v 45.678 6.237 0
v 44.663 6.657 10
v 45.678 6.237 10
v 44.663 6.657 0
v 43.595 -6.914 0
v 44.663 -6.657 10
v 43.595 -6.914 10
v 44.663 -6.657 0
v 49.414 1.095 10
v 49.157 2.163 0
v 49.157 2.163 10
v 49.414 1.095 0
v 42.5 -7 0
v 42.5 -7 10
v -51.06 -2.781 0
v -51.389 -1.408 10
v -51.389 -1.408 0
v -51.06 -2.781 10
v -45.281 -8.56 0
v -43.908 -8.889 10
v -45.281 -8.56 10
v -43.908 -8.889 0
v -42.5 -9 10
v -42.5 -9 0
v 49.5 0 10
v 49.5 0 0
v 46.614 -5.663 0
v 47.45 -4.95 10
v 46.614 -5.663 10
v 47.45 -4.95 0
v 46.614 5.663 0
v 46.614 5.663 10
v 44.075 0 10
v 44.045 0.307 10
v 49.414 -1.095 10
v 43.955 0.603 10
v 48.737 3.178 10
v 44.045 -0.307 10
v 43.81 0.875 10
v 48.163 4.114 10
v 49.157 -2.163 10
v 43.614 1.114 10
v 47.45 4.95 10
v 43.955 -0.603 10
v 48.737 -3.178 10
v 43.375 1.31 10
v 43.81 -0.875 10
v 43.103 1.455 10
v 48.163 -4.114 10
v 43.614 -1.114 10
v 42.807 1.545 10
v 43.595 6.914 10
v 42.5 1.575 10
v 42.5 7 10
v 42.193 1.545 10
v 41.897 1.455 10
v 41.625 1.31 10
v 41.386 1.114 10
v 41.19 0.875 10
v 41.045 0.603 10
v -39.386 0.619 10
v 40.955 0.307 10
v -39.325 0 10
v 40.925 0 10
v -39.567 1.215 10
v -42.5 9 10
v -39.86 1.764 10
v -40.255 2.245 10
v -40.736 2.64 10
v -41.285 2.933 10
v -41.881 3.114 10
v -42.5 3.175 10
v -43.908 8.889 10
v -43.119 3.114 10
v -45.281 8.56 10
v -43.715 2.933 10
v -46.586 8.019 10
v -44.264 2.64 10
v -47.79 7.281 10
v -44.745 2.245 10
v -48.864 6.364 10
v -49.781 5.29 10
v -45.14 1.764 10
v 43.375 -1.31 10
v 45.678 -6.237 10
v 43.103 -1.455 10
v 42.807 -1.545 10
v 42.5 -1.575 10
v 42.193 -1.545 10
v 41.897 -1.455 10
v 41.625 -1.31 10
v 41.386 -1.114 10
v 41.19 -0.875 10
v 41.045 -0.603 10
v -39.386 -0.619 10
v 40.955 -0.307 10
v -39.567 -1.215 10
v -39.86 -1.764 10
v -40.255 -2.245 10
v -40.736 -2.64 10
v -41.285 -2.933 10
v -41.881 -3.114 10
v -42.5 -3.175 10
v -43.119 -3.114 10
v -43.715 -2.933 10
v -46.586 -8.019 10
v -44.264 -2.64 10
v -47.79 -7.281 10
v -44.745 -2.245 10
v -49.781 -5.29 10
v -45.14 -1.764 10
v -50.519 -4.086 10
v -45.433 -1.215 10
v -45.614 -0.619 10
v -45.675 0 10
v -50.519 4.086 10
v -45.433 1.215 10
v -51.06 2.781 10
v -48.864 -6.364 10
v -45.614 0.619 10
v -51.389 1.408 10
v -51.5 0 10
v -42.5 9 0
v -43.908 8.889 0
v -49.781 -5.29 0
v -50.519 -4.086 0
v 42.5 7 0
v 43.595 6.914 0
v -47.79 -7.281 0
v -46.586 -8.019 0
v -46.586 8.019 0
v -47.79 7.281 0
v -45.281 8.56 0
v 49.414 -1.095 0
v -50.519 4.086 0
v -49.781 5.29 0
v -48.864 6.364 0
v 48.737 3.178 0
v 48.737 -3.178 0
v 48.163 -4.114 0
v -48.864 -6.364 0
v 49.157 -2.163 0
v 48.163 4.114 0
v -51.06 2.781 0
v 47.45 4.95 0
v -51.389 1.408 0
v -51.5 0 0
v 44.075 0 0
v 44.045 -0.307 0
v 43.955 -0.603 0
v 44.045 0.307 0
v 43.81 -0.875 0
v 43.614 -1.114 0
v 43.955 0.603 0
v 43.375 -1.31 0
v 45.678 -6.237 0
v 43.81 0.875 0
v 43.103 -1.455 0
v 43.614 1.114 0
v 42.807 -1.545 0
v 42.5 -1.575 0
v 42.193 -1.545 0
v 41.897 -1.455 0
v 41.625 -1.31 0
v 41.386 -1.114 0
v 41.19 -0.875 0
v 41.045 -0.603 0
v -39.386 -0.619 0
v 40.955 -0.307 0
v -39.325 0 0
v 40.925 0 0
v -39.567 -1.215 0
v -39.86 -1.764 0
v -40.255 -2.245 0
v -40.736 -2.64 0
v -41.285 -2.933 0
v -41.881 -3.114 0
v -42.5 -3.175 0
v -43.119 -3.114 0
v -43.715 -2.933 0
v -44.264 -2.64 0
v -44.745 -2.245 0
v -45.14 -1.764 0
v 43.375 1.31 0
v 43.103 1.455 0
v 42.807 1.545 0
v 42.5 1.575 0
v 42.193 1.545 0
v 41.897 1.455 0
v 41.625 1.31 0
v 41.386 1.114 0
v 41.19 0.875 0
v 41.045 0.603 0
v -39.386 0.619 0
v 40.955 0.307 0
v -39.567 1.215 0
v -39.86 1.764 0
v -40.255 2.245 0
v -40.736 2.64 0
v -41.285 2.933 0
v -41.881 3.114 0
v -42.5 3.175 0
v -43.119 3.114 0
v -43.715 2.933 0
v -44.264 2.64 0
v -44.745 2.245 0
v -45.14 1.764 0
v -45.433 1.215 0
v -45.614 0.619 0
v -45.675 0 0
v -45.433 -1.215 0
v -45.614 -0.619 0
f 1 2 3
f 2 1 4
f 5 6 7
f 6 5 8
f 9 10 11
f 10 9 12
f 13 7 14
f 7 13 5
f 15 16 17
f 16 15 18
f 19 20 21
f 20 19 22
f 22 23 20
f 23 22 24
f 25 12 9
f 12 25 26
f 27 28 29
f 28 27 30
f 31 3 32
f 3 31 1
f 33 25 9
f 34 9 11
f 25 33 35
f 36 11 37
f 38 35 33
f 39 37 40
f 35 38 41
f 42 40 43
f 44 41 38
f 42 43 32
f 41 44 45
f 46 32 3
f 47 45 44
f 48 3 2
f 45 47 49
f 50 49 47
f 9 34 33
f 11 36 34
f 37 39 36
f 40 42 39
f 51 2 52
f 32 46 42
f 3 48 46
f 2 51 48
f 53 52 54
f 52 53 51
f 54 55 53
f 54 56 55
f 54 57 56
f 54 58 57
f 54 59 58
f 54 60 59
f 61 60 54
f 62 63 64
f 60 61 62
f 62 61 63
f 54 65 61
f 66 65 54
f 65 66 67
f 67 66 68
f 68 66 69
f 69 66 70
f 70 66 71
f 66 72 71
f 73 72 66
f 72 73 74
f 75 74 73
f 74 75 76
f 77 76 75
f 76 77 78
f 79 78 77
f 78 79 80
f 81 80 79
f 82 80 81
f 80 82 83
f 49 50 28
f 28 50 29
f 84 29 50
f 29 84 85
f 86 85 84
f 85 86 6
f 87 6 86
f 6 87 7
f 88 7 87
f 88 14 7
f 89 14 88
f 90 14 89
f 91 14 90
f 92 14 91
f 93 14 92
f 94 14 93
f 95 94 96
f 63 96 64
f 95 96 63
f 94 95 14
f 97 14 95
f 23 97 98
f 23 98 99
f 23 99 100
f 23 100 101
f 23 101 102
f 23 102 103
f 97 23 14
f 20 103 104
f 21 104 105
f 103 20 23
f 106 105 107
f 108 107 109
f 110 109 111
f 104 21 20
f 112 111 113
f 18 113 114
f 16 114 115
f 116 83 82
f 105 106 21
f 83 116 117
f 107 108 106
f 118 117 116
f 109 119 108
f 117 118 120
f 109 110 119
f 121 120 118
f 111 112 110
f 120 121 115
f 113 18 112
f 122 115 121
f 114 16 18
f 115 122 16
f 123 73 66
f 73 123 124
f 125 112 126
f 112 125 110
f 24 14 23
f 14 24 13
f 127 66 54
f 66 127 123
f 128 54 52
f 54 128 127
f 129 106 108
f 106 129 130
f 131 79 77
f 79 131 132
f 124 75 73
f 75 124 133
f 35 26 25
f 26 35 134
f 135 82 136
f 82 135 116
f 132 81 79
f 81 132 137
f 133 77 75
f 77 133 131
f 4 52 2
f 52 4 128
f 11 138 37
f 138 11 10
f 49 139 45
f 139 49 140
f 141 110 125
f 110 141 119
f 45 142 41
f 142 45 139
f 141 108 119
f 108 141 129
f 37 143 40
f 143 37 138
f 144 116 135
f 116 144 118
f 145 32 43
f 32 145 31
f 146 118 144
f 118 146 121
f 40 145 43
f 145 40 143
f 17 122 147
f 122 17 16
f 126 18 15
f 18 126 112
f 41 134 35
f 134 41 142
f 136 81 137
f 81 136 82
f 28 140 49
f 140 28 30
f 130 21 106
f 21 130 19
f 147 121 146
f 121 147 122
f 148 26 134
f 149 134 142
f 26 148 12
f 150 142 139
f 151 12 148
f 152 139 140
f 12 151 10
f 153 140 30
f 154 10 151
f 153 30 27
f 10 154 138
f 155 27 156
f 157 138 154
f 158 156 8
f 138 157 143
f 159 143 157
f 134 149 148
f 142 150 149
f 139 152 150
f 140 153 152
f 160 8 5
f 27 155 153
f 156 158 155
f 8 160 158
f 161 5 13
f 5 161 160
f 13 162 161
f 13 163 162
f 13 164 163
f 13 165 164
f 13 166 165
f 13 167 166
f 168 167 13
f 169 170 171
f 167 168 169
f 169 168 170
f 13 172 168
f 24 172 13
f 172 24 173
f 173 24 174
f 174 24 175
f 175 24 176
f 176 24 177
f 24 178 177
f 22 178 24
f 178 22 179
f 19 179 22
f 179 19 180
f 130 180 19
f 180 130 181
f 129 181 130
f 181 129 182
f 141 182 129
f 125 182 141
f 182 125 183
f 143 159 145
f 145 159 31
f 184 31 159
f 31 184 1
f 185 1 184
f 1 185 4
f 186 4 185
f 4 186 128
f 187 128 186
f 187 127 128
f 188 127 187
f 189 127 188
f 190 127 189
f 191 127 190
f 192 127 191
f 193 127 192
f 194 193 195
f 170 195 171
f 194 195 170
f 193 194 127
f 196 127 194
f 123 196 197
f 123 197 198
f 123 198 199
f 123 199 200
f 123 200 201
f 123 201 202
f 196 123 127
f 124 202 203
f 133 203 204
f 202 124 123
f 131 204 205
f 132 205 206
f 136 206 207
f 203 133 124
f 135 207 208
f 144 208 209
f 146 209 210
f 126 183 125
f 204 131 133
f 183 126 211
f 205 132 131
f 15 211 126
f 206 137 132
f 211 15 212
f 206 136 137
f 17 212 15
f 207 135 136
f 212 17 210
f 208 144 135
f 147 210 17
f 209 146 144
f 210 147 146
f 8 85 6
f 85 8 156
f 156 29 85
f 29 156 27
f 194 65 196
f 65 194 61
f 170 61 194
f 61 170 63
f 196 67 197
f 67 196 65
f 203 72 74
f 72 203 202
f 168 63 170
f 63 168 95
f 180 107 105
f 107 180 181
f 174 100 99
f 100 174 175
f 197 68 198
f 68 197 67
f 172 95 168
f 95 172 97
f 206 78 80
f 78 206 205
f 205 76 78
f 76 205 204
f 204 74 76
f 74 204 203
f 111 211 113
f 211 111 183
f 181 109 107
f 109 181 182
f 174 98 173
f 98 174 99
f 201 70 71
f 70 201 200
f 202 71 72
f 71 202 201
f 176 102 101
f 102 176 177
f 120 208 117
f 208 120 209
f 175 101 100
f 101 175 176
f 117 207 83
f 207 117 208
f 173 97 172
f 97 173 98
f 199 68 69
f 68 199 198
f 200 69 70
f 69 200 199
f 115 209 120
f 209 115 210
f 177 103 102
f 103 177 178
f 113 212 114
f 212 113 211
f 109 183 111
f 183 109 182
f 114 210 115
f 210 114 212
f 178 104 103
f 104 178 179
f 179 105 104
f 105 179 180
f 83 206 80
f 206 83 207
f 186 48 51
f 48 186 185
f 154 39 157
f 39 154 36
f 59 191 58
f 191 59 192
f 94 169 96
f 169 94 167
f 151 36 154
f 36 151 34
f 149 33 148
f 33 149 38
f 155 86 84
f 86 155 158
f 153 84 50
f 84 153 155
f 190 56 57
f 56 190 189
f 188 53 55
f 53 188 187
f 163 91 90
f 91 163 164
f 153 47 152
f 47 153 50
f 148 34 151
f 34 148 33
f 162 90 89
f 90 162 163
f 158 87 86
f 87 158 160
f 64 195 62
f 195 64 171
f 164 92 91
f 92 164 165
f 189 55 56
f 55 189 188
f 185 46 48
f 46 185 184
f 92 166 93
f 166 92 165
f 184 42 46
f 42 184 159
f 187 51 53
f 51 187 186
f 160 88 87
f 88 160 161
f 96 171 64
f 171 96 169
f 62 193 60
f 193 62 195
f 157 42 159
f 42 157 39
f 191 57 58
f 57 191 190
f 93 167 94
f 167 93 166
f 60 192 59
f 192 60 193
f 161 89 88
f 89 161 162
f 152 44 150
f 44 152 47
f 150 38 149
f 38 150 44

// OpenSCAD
$fn = 32;

// ----------------------------------------------------------------------
// Lever: 85 mm between the bosses, 10 mm thick, smooth outline
// ----------------------------------------------------------------------

// --- parameters (mm) ---
lever_l = 85;             // distance between the boss centres
boss_a = 18;              // first boss diameter
boss_b = 14;              // second boss diameter
bore_a = 6.35;            // first bore
bore_b = 3.15;            // second bore
lever_t = 10;             // lever thickness

lever_profile = [[-51.5, 0], [-51.389, -1.408], [-51.06, -2.781], [-50.519, -4.086], [-49.781, -5.29], [-48.864, -6.364], [-47.79, -7.281], [-46.586, -8.019], [-45.281, -8.56], [-43.908, -8.889], [-42.5, -9], [42.5, -7], [43.595, -6.914], [44.663, -6.657], [45.678, -6.237], [46.614, -5.663], [47.45, -4.95], [48.163, -4.114], [48.737, -3.178], [49.157, -2.163], [49.414, -1.095], [49.5, 0], [49.414, 1.095], [49.157, 2.163], [48.737, 3.178], [48.163, 4.114], [47.45, 4.95], [46.614, 5.663], [45.678, 6.237], [44.663, 6.657], [43.595, 6.914], [42.5, 7], [-42.5, 9], [-43.908, 8.889], [-45.281, 8.56], [-46.586, 8.019], [-47.79, 7.281], [-48.864, 6.364], [-49.781, 5.29], [-50.519, 4.086], [-51.06, 2.781], [-51.389, 1.408]];

difference() {
  linear_extrude(height = lever_t) polygon(lever_profile);
  translate([-42.5, 0, -2.5]) cylinder(h = lever_t + 5, d = bore_a);
  translate([42.5, 0, -2.5]) cylinder(h = lever_t + 5, d = bore_b);
}
